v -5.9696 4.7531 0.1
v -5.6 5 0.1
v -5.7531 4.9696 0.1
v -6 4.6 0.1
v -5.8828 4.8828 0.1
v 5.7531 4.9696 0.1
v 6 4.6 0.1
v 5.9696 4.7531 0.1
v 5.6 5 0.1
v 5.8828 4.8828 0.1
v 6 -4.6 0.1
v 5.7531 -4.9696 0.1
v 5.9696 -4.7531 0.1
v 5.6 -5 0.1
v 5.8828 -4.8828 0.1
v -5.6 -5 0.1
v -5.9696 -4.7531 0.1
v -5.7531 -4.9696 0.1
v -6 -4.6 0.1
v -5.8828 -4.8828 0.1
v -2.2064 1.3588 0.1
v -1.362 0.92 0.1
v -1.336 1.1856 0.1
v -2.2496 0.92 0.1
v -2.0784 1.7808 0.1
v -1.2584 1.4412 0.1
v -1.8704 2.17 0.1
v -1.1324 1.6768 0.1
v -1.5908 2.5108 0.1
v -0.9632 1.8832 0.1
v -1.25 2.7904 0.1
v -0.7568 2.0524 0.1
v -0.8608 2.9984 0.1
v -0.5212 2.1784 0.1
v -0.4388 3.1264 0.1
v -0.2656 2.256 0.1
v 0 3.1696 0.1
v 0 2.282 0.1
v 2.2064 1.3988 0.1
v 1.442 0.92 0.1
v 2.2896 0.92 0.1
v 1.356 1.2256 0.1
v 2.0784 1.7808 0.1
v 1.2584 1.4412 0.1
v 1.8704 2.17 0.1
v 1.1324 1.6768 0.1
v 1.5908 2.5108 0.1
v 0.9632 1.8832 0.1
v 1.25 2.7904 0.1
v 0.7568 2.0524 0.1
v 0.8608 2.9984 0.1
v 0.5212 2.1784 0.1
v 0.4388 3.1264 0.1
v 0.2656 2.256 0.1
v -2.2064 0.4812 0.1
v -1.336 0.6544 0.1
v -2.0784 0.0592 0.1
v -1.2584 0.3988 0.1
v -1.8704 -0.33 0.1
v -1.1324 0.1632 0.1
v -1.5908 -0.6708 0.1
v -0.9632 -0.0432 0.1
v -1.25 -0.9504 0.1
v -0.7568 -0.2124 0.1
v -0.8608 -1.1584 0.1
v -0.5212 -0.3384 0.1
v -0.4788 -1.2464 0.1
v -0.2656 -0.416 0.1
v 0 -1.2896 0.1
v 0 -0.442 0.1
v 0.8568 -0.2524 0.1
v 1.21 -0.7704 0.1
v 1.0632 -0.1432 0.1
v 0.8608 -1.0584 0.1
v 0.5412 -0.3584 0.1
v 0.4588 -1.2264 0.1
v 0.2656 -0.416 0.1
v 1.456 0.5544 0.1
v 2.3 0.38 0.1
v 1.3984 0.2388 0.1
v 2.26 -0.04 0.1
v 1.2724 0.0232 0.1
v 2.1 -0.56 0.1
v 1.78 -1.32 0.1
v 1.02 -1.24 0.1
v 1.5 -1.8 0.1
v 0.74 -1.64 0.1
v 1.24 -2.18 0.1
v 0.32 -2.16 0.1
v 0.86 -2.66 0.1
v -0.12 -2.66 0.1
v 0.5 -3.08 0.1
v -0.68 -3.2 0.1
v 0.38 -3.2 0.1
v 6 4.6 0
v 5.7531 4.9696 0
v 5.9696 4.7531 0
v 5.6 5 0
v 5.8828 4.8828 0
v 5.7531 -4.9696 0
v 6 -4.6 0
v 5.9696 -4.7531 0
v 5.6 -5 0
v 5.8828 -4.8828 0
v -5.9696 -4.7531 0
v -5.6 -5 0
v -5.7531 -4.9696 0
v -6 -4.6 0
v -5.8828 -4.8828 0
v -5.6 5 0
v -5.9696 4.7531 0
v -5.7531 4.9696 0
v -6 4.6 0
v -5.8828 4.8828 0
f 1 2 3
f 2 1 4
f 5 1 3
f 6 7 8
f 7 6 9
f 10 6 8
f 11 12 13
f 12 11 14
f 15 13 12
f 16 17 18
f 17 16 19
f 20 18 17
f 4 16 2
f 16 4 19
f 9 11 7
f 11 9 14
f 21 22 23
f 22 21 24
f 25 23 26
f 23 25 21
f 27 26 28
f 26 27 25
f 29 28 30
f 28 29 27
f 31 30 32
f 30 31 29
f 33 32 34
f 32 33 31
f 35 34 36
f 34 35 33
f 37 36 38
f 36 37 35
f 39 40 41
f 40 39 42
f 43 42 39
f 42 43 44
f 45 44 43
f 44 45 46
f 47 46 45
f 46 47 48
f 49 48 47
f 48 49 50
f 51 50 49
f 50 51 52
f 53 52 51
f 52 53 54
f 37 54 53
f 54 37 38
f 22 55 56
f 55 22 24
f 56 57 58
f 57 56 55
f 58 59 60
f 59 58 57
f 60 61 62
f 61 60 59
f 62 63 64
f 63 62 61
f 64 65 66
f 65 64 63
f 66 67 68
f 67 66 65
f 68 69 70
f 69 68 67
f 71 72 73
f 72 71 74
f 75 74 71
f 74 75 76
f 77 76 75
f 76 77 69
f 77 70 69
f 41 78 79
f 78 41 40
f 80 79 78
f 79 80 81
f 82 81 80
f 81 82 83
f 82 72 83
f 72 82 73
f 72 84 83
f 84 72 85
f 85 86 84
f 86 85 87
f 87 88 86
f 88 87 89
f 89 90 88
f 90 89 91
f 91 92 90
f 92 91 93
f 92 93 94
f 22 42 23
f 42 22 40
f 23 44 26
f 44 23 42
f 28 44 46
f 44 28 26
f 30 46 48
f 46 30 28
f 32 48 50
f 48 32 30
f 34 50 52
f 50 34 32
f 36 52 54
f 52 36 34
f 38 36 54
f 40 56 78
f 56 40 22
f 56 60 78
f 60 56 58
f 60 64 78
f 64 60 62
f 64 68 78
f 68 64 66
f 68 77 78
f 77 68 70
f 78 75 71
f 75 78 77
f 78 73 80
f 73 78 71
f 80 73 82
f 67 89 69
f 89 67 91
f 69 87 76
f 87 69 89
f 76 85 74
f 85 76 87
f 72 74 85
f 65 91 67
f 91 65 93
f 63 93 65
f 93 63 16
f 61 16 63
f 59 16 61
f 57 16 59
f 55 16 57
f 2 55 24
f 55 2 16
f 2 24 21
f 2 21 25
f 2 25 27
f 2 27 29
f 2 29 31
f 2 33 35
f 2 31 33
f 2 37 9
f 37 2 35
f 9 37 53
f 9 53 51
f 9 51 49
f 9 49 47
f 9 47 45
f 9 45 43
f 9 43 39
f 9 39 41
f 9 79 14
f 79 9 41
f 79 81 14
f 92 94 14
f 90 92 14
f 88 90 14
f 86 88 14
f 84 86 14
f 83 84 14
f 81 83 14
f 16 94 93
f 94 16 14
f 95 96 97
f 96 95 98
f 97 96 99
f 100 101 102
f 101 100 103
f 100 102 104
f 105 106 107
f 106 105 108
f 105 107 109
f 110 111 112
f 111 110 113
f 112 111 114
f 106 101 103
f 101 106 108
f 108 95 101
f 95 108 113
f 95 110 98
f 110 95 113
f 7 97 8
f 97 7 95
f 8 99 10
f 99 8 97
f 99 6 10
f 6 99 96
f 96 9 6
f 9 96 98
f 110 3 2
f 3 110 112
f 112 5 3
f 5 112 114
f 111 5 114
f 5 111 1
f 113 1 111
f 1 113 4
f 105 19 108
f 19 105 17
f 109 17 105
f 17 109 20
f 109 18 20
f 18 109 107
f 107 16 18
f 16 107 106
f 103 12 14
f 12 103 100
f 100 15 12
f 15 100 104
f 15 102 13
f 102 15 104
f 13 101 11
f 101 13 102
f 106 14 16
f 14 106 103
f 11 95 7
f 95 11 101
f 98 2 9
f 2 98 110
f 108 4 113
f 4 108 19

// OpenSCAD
// file: ../p/1-4cyli.scad
use <../lib.scad>
function ldraw_lib__1_4cyli() = [
// 0 Cylinder 0.25
// 0 Name: 1-4cyli.dat
// 0 Author: James Jessiman
// 0 !LDRAW_ORG Primitive UPDATE 2012-01
// 0 !LICENSE Licensed under CC BY 4.0 : see CAreadme.txt
// 
// 0 BFC CERTIFY CCW
  [0,"BFC","CERTIFY"],
  [0,"BFC","CCW"],
// 
// 0 !HISTORY 2002-03-23 [sbliss] Added BFC statement.
// 0 !HISTORY 2002-04-25 [PTadmin] Official Update 2002-02
// 0 !HISTORY 2007-06-22 [PTadmin] Header formatted for Contributor Agreement
// 0 !HISTORY 2008-07-01 [PTadmin] Official Update 2008-01
// 0 !HISTORY 2012-02-16 [Philo] Changed to CCW
// 0 !HISTORY 2012-03-30 [PTadmin] Official Update 2012-01
// 
// 
// 4 16 1 1 0 0.9239 1 0.3827 0.9239 0 0.3827 1 0 0
  [4,16,1,1,0,0.9239,1,0.3827,0.9239,0,0.3827,1,0,0],
// 5 24 1 0 0 1 1 0 0.9239 0 0.3827 1 0 -1
  [5,24,1,0,0,1,1,0,0.9239,0,0.3827,1,0,-1],
// 4 16 0.9239 1 0.3827 0.7071 1 0.7071 0.7071 0 0.7071 0.9239 0 0.3827
  [4,16,0.9239,1,0.3827,0.7071,1,0.7071,0.7071,0,0.7071,0.9239,0,0.3827],
// 5 24 0.9239 0 0.3827 0.9239 1 0.3827 0.7071 0 0.7071 1 0 0
  [5,24,0.9239,0,0.3827,0.9239,1,0.3827,0.7071,0,0.7071,1,0,0],
// 4 16 0.7071 1 0.7071 0.3827 1 0.9239 0.3827 0 0.9239 0.7071 0 0.7071
  [4,16,0.7071,1,0.7071,0.3827,1,0.9239,0.3827,0,0.9239,0.7071,0,0.7071],
// 5 24 0.7071 0 0.7071 0.7071 1 0.7071 0.3827 0 0.9239 0.9239 0 0.3827
  [5,24,0.7071,0,0.7071,0.7071,1,0.7071,0.3827,0,0.9239,0.9239,0,0.3827],
// 4 16 0.3827 1 0.9239 0 1 1 0 0 1 0.3827 0 0.9239
  [4,16,0.3827,1,0.9239,0,1,1,0,0,1,0.3827,0,0.9239],
// 5 24 0.3827 0 0.9239 0.3827 1 0.9239 0 0 1 0.7071 0 0.7071
  [5,24,0.3827,0,0.9239,0.3827,1,0.9239,0,0,1,0.7071,0,0.7071],
// 5 24 0 0 1 0 1 1 0.3827 0 0.9239 -1 0 1
  [5,24,0,0,1,0,1,1,0.3827,0,0.9239,-1,0,1],
];
module ldraw_lib__1_4cyli(step=0, col=false, unit=2/5, alt=false, line=0.2, solid=!$preview)
    makepoly(ldraw_lib__1_4cyli(), step=step, col=col, unit=unit, alt=alt, line=line, solid=solid);
ldraw_lib__1_4cyli(line=0.2);
// file: ../p/1-4chrd.scad
use <../lib.scad>
function ldraw_lib__1_4chrd() = [
// 0 Chord 0.25
// 0 Name: 1-4chrd.dat
// 0 Author: Max Martin Richter [MMR1988]
// 0 !LDRAW_ORG Primitive UPDATE 2023-05
// 0 !LICENSE Licensed under CC BY 4.0 : see CAreadme.txt
// 
// 0 BFC CERTIFY CCW
  [0,"BFC","CERTIFY"],
  [0,"BFC","CCW"],
// 
// 0 !HISTORY 2004-04-22 [PTadmin] Official Update 2004-02
// 0 !HISTORY 2007-10-09 [PTadmin] Header formatted for Contributor Agreement
// 0 !HISTORY 2008-07-01 [PTadmin] Official Update 2008-01
// 0 !HISTORY 2012-08-02 [MMR1988] Re-creation with PrimGen2 and Rectifier
// 0 !HISTORY 2012-08-09 [PTadmin] Official Update 2012-02
// 0 !HISTORY 2023-10-27 [OrionP] Change author to MMR1988 from hafhead
// 0 !HISTORY 2023-10-31 [OrionP] Official Update 2023-05
// 
// 4 16 0.9239 0 0.3827 0.3827 0 0.9239 0 0 1 1 0 0
  [4,16,0.9239,0,0.3827,0.3827,0,0.9239,0,0,1,1,0,0],
// 3 16 0.7071 0 0.7071 0.3827 0 0.9239 0.9239 0 0.3827
  [3,16,0.7071,0,0.7071,0.3827,0,0.9239,0.9239,0,0.3827],
];
module ldraw_lib__1_4chrd(step=0, col=false, unit=2/5, alt=false, line=0.2, solid=!$preview)
    makepoly(ldraw_lib__1_4chrd(), step=step, col=col, unit=unit, alt=alt, line=line, solid=solid);
ldraw_lib__1_4chrd(line=0.2);
// main file
use <../lib.scad>
use <../p/1-4chrd.scad>
use <../p/1-4cyli.scad>
function ldraw_lib__6196575o() = [
// 0 Sticker  1.2 x  1.5 with White "9" on Black Background
// 0 Name: 6196575o.dat
// 0 Author: Evert-Jan Boer [ejboer]
// 0 !LDRAW_ORG Part UPDATE 2024-08
// 0 !LICENSE Licensed under CC BY 4.0 : see CAreadme.txt
// 
// 0 BFC CERTIFY CCW
  [0,"BFC","CERTIFY"],
  [0,"BFC","CCW"],
// 
// 0 !KEYWORDS London Bus, set 10258
// 
// 0 !HISTORY 2024-09-30 [OrionP] Official Update 2024-08
// 
// 1 0 -14 -.25 11.5 0 0 -1 0 1 0 1 0 0 1-4chrd.dat
  [1,0,-14,-.25,11.5,0,0,-1,0,1,0,1,0,0, ldraw_lib__1_4chrd()],
// 1 0 14 -.25 11.5 1 0 0 0 1 0 0 0 1 1-4chrd.dat
  [1,0,14,-.25,11.5,1,0,0,0,1,0,0,0,1, ldraw_lib__1_4chrd()],
// 1 0 14 -.25 -11.5 0 0 1 0 1 0 -1 0 0 1-4chrd.dat
  [1,0,14,-.25,-11.5,0,0,1,0,1,0,-1,0,0, ldraw_lib__1_4chrd()],
// 1 0 -14 -.25 -11.5 -1 0 0 0 1 0 0 0 -1 1-4chrd.dat
  [1,0,-14,-.25,-11.5,-1,0,0,0,1,0,0,0,-1, ldraw_lib__1_4chrd()],
// 4 0 -15 -.25 -11.5 -14 -.25 -12.5 -14 -.25 12.5 -15 -.25 11.5
  [4,0,-15,-.25,-11.5,-14,-.25,-12.5,-14,-.25,12.5,-15,-.25,11.5],
// 4 0 15 -.25 11.5 14 -.25 12.5 14 -.25 -12.5 15 -.25 -11.5
  [4,0,15,-.25,11.5,14,-.25,12.5,14,-.25,-12.5,15,-.25,-11.5],
// 4 15 -3.34 -.25 2.964 -5.516 -.25 3.397 -5.624 -.25 2.3 -3.405 -.25 2.3
  [4,15,-3.34,-.25,2.964,-5.516,-.25,3.397,-5.624,-.25,2.3,-3.405,-.25,2.3],
// 4 15 -5.516 -.25 3.397 -3.34 -.25 2.964 -3.146 -.25 3.603 -5.196 -.25 4.452
  [4,15,-5.516,-.25,3.397,-3.34,-.25,2.964,-3.146,-.25,3.603,-5.196,-.25,4.452],
// 4 15 -2.831 -.25 4.192 -4.676 -.25 5.425 -5.196 -.25 4.452 -3.146 -.25 3.603
  [4,15,-2.831,-.25,4.192,-4.676,-.25,5.425,-5.196,-.25,4.452,-3.146,-.25,3.603],
// 4 15 -4.676 -.25 5.425 -2.831 -.25 4.192 -2.408 -.25 4.708 -3.977 -.25 6.277
  [4,15,-4.676,-.25,5.425,-2.831,-.25,4.192,-2.408,-.25,4.708,-3.977,-.25,6.277],
// 4 15 -1.892 -.25 5.131 -3.125 -.25 6.976 -3.977 -.25 6.277 -2.408 -.25 4.708
  [4,15,-1.892,-.25,5.131,-3.125,-.25,6.976,-3.977,-.25,6.277,-2.408,-.25,4.708],
// 4 15 -3.125 -.25 6.976 -1.892 -.25 5.131 -1.303 -.25 5.446 -2.152 -.25 7.496
  [4,15,-3.125,-.25,6.976,-1.892,-.25,5.131,-1.303,-.25,5.446,-2.152,-.25,7.496],
// 4 15 -2.152 -.25 7.496 -1.303 -.25 5.446 -.664 -.25 5.64 -1.097 -.25 7.816
  [4,15,-2.152,-.25,7.496,-1.303,-.25,5.446,-.664,-.25,5.64,-1.097,-.25,7.816],
// 4 15 -1.097 -.25 7.816 -.664 -.25 5.64 0 -.25 5.705 0 -.25 7.924
  [4,15,-1.097,-.25,7.816,-.664,-.25,5.64,0,-.25,5.705,0,-.25,7.924],
// 4 15 3.39 -.25 3.064 3.605 -.25 2.3 5.724 -.25 2.3 5.516 -.25 3.497
  [4,15,3.39,-.25,3.064,3.605,-.25,2.3,5.724,-.25,2.3,5.516,-.25,3.497],
// 4 15 5.516 -.25 3.497 5.196 -.25 4.452 3.146 -.25 3.603 3.39 -.25 3.064
  [4,15,5.516,-.25,3.497,5.196,-.25,4.452,3.146,-.25,3.603,3.39,-.25,3.064],
// 4 15 2.831 -.25 4.192 3.146 -.25 3.603 5.196 -.25 4.452 4.676 -.25 5.425
  [4,15,2.831,-.25,4.192,3.146,-.25,3.603,5.196,-.25,4.452,4.676,-.25,5.425],
// 4 15 4.676 -.25 5.425 3.977 -.25 6.277 2.408 -.25 4.708 2.831 -.25 4.192
  [4,15,4.676,-.25,5.425,3.977,-.25,6.277,2.408,-.25,4.708,2.831,-.25,4.192],
// 4 15 1.892 -.25 5.131 2.408 -.25 4.708 3.977 -.25 6.277 3.125 -.25 6.976
  [4,15,1.892,-.25,5.131,2.408,-.25,4.708,3.977,-.25,6.277,3.125,-.25,6.976],
// 4 15 3.125 -.25 6.976 2.152 -.25 7.496 1.303 -.25 5.446 1.892 -.25 5.131
  [4,15,3.125,-.25,6.976,2.152,-.25,7.496,1.303,-.25,5.446,1.892,-.25,5.131],
// 4 15 2.152 -.25 7.496 1.097 -.25 7.816 .664 -.25 5.64 1.303 -.25 5.446
  [4,15,2.152,-.25,7.496,1.097,-.25,7.816,.664,-.25,5.64,1.303,-.25,5.446],
// 4 15 1.097 -.25 7.816 0 -.25 7.924 0 -.25 5.705 .664 -.25 5.64
  [4,15,1.097,-.25,7.816,0,-.25,7.924,0,-.25,5.705,.664,-.25,5.64],
// 4 15 -3.34 -.25 1.636 -3.405 -.25 2.3 -5.624 -.25 2.3 -5.516 -.25 1.203
  [4,15,-3.34,-.25,1.636,-3.405,-.25,2.3,-5.624,-.25,2.3,-5.516,-.25,1.203],
// 4 15 -5.516 -.25 1.203 -5.196 -.25 .148 -3.146 -.25 .997 -3.34 -.25 1.636
  [4,15,-5.516,-.25,1.203,-5.196,-.25,.148,-3.146,-.25,.997,-3.34,-.25,1.636],
// 4 15 -2.831 -.25 .408 -3.146 -.25 .997 -5.196 -.25 .148 -4.676 -.25 -.825
  [4,15,-2.831,-.25,.408,-3.146,-.25,.997,-5.196,-.25,.148,-4.676,-.25,-.825],
// 4 15 -4.676 -.25 -.825 -3.977 -.25 -1.677 -2.408 -.25 -.108 -2.831 -.25 .408
  [4,15,-4.676,-.25,-.825,-3.977,-.25,-1.677,-2.408,-.25,-.108,-2.831,-.25,.408],
// 4 15 -1.892 -.25 -.531 -2.408 -.25 -.108 -3.977 -.25 -1.677 -3.125 -.25 -2.376
  [4,15,-1.892,-.25,-.531,-2.408,-.25,-.108,-3.977,-.25,-1.677,-3.125,-.25,-2.376],
// 4 15 -3.125 -.25 -2.376 -2.152 -.25 -2.896 -1.303 -.25 -.846 -1.892 -.25 -.531
  [4,15,-3.125,-.25,-2.376,-2.152,-.25,-2.896,-1.303,-.25,-.846,-1.892,-.25,-.531],
// 4 15 -2.152 -.25 -2.896 -1.197 -.25 -3.116 -.664 -.25 -1.04 -1.303 -.25 -.846
  [4,15,-2.152,-.25,-2.896,-1.197,-.25,-3.116,-.664,-.25,-1.04,-1.303,-.25,-.846],
// 4 15 -1.197 -.25 -3.116 0 -.25 -3.224 0 -.25 -1.105 -.664 -.25 -1.04
  [4,15,-1.197,-.25,-3.116,0,-.25,-3.224,0,-.25,-1.105,-.664,-.25,-1.04],
// 4 15 2.152 -.25 -2.646 3.025 -.25 -1.926 2.658 -.25 -.358 2.142 -.25 -.631
  [4,15,2.152,-.25,-2.646,3.025,-.25,-1.926,2.658,-.25,-.358,2.142,-.25,-.631],
// 4 15 2.142 -.25 -.631 1.353 -.25 -.896 1.147 -.25 -3.066 2.152 -.25 -2.646
  [4,15,2.142,-.25,-.631,1.353,-.25,-.896,1.147,-.25,-3.066,2.152,-.25,-2.646],
// 4 15 0 -.25 -3.224 1.147 -.25 -3.066 1.353 -.25 -.896 .664 -.25 -1.04
  [4,15,0,-.25,-3.224,1.147,-.25,-3.066,1.353,-.25,-.896,.664,-.25,-1.04],
// 3 15 .664 -.25 -1.04 0 -.25 -1.105 0 -.25 -3.224
  [3,15,.664,-.25,-1.04,0,-.25,-1.105,0,-.25,-3.224],
// 4 15 5.75 -.25 .95 5.724 -.25 2.3 3.605 -.25 2.3 3.64 -.25 1.386
  [4,15,5.75,-.25,.95,5.724,-.25,2.3,3.605,-.25,2.3,3.64,-.25,1.386],
// 4 15 5.65 -.25 -.1 5.75 -.25 .95 3.64 -.25 1.386 3.496 -.25 .597
  [4,15,5.65,-.25,-.1,5.75,-.25,.95,3.64,-.25,1.386,3.496,-.25,.597],
// 4 15 3.496 -.25 .597 3.181 -.25 .058 5.25 -.25 -1.4 5.65 -.25 -.1
  [4,15,3.496,-.25,.597,3.181,-.25,.058,5.25,-.25,-1.4,5.65,-.25,-.1],
// 4 15 3.181 -.25 .058 2.658 -.25 -.358 3.025 -.25 -1.926 5.25 -.25 -1.4
  [4,15,3.181,-.25,.058,2.658,-.25,-.358,3.025,-.25,-1.926,5.25,-.25,-1.4],
// 4 15 5.25 -.25 -1.4 3.025 -.25 -1.926 2.55 -.25 -3.1 4.45 -.25 -3.3
  [4,15,5.25,-.25,-1.4,3.025,-.25,-1.926,2.55,-.25,-3.1,4.45,-.25,-3.3],
// 4 15 1.85 -.25 -4.1 3.75 -.25 -4.5 4.45 -.25 -3.3 2.55 -.25 -3.1
  [4,15,1.85,-.25,-4.1,3.75,-.25,-4.5,4.45,-.25,-3.3,2.55,-.25,-3.1],
// 4 15 .8 -.25 -5.4 3.1 -.25 -5.45 3.75 -.25 -4.5 1.85 -.25 -4.1
  [4,15,.8,-.25,-5.4,3.1,-.25,-5.45,3.75,-.25,-4.5,1.85,-.25,-4.1],
// 4 15 -.3 -.25 -6.65 2.15 -.25 -6.65 3.1 -.25 -5.45 .8 -.25 -5.4
  [4,15,-.3,-.25,-6.65,2.15,-.25,-6.65,3.1,-.25,-5.45,.8,-.25,-5.4],
// 4 15 2.15 -.25 -6.65 -.3 -.25 -6.65 -1.7 -.25 -8 1.25 -.25 -7.7
  [4,15,2.15,-.25,-6.65,-.3,-.25,-6.65,-1.7,-.25,-8,1.25,-.25,-7.7],
// 3 15 1.25 -.25 -7.7 -1.7 -.25 -8 .95 -.25 -8
  [3,15,1.25,-.25,-7.7,-1.7,-.25,-8,.95,-.25,-8],
// 4 0 -3.405 -.25 2.3 3.605 -.25 2.3 3.39 -.25 3.064 -3.34 -.25 2.964
  [4,0,-3.405,-.25,2.3,3.605,-.25,2.3,3.39,-.25,3.064,-3.34,-.25,2.964],
// 4 0 3.39 -.25 3.064 3.146 -.25 3.603 -3.146 -.25 3.603 -3.34 -.25 2.964
  [4,0,3.39,-.25,3.064,3.146,-.25,3.603,-3.146,-.25,3.603,-3.34,-.25,2.964],
// 4 0 -3.146 -.25 3.603 3.146 -.25 3.603 2.831 -.25 4.192 -2.831 -.25 4.192
  [4,0,-3.146,-.25,3.603,3.146,-.25,3.603,2.831,-.25,4.192,-2.831,-.25,4.192],
// 4 0 -2.408 -.25 4.708 -2.831 -.25 4.192 2.831 -.25 4.192 2.408 -.25 4.708
  [4,0,-2.408,-.25,4.708,-2.831,-.25,4.192,2.831,-.25,4.192,2.408,-.25,4.708],
// 4 0 -2.408 -.25 4.708 2.408 -.25 4.708 1.892 -.25 5.131 -1.892 -.25 5.131
  [4,0,-2.408,-.25,4.708,2.408,-.25,4.708,1.892,-.25,5.131,-1.892,-.25,5.131],
// 4 0 -1.303 -.25 5.446 -1.892 -.25 5.131 1.892 -.25 5.131 1.303 -.25 5.446
  [4,0,-1.303,-.25,5.446,-1.892,-.25,5.131,1.892,-.25,5.131,1.303,-.25,5.446],
// 4 0 1.303 -.25 5.446 .664 -.25 5.64 -.664 -.25 5.64 -1.303 -.25 5.446
  [4,0,1.303,-.25,5.446,.664,-.25,5.64,-.664,-.25,5.64,-1.303,-.25,5.446],
// 3 0 0 -.25 5.705 -.664 -.25 5.64 .664 -.25 5.64
  [3,0,0,-.25,5.705,-.664,-.25,5.64,.664,-.25,5.64],
// 4 0 -3.34 -.25 1.636 3.64 -.25 1.386 3.605 -.25 2.3 -3.405 -.25 2.3
  [4,0,-3.34,-.25,1.636,3.64,-.25,1.386,3.605,-.25,2.3,-3.405,-.25,2.3],
// 4 0 -3.34 -.25 1.636 -3.146 -.25 .997 -2.831 -.25 .408 3.64 -.25 1.386
  [4,0,-3.34,-.25,1.636,-3.146,-.25,.997,-2.831,-.25,.408,3.64,-.25,1.386],
// 4 0 -1.892 -.25 -.531 3.64 -.25 1.386 -2.831 -.25 .408 -2.408 -.25 -.108
  [4,0,-1.892,-.25,-.531,3.64,-.25,1.386,-2.831,-.25,.408,-2.408,-.25,-.108],
// 4 0 -.664 -.25 -1.04 3.64 -.25 1.386 -1.892 -.25 -.531 -1.303 -.25 -.846
  [4,0,-.664,-.25,-1.04,3.64,-.25,1.386,-1.892,-.25,-.531,-1.303,-.25,-.846],
// 4 0 .664 -.25 -1.04 3.64 -.25 1.386 -.664 -.25 -1.04 0 -.25 -1.105
  [4,0,.664,-.25,-1.04,3.64,-.25,1.386,-.664,-.25,-1.04,0,-.25,-1.105],
// 4 0 2.142 -.25 -.631 3.64 -.25 1.386 .664 -.25 -1.04 1.353 -.25 -.896
  [4,0,2.142,-.25,-.631,3.64,-.25,1.386,.664,-.25,-1.04,1.353,-.25,-.896],
// 4 0 3.496 -.25 .597 3.64 -.25 1.386 2.142 -.25 -.631 2.658 -.25 -.358
  [4,0,3.496,-.25,.597,3.64,-.25,1.386,2.142,-.25,-.631,2.658,-.25,-.358],
// 3 0 3.496 -.25 .597 2.658 -.25 -.358 3.181 -.25 .058
  [3,0,3.496,-.25,.597,2.658,-.25,-.358,3.181,-.25,.058],
// 4 0 .8 -.25 -5.4 0 -.25 -3.224 -1.197 -.25 -3.116 -.3 -.25 -6.65
  [4,0,.8,-.25,-5.4,0,-.25,-3.224,-1.197,-.25,-3.116,-.3,-.25,-6.65],
// 4 0 1.85 -.25 -4.1 1.147 -.25 -3.066 0 -.25 -3.224 .8 -.25 -5.4
  [4,0,1.85,-.25,-4.1,1.147,-.25,-3.066,0,-.25,-3.224,.8,-.25,-5.4],
// 4 0 2.55 -.25 -3.1 2.152 -.25 -2.646 1.147 -.25 -3.066 1.85 -.25 -4.1
  [4,0,2.55,-.25,-3.1,2.152,-.25,-2.646,1.147,-.25,-3.066,1.85,-.25,-4.1],
// 3 0 3.025 -.25 -1.926 2.152 -.25 -2.646 2.55 -.25 -3.1
  [3,0,3.025,-.25,-1.926,2.152,-.25,-2.646,2.55,-.25,-3.1],
// 4 0 -.3 -.25 -6.65 -1.197 -.25 -3.116 -2.152 -.25 -2.896 -1.7 -.25 -8
  [4,0,-.3,-.25,-6.65,-1.197,-.25,-3.116,-2.152,-.25,-2.896,-1.7,-.25,-8],
// 4 0 -14 -.25 -12.5 -1.7 -.25 -8 -2.152 -.25 -2.896 -3.125 -.25 -2.376
  [4,0,-14,-.25,-12.5,-1.7,-.25,-8,-2.152,-.25,-2.896,-3.125,-.25,-2.376],
// 3 0 -3.977 -.25 -1.677 -14 -.25 -12.5 -3.125 -.25 -2.376
  [3,0,-3.977,-.25,-1.677,-14,-.25,-12.5,-3.125,-.25,-2.376],
// 3 0 -4.676 -.25 -.825 -14 -.25 -12.5 -3.977 -.25 -1.677
  [3,0,-4.676,-.25,-.825,-14,-.25,-12.5,-3.977,-.25,-1.677],
// 3 0 -5.196 -.25 .148 -14 -.25 -12.5 -4.676 -.25 -.825
  [3,0,-5.196,-.25,.148,-14,-.25,-12.5,-4.676,-.25,-.825],
// 3 0 -5.516 -.25 1.203 -14 -.25 -12.5 -5.196 -.25 .148
  [3,0,-5.516,-.25,1.203,-14,-.25,-12.5,-5.196,-.25,.148],
// 4 0 -14 -.25 12.5 -14 -.25 -12.5 -5.516 -.25 1.203 -5.624 -.25 2.3
  [4,0,-14,-.25,12.5,-14,-.25,-12.5,-5.516,-.25,1.203,-5.624,-.25,2.3],
// 3 0 -14 -.25 12.5 -5.624 -.25 2.3 -5.516 -.25 3.397
  [3,0,-14,-.25,12.5,-5.624,-.25,2.3,-5.516,-.25,3.397],
// 3 0 -14 -.25 12.5 -5.516 -.25 3.397 -5.196 -.25 4.452
  [3,0,-14,-.25,12.5,-5.516,-.25,3.397,-5.196,-.25,4.452],
// 3 0 -14 -.25 12.5 -5.196 -.25 4.452 -4.676 -.25 5.425
  [3,0,-14,-.25,12.5,-5.196,-.25,4.452,-4.676,-.25,5.425],
// 3 0 -14 -.25 12.5 -4.676 -.25 5.425 -3.977 -.25 6.277
  [3,0,-14,-.25,12.5,-4.676,-.25,5.425,-3.977,-.25,6.277],
// 3 0 -14 -.25 12.5 -3.977 -.25 6.277 -3.125 -.25 6.976
  [3,0,-14,-.25,12.5,-3.977,-.25,6.277,-3.125,-.25,6.976],
// 3 0 -14 -.25 12.5 -2.152 -.25 7.496 -1.097 -.25 7.816
  [3,0,-14,-.25,12.5,-2.152,-.25,7.496,-1.097,-.25,7.816],
// 3 0 -14 -.25 12.5 -3.125 -.25 6.976 -2.152 -.25 7.496
  [3,0,-14,-.25,12.5,-3.125,-.25,6.976,-2.152,-.25,7.496],
// 4 0 -1.097 -.25 7.816 0 -.25 7.924 14 -.25 12.5 -14 -.25 12.5
  [4,0,-1.097,-.25,7.816,0,-.25,7.924,14,-.25,12.5,-14,-.25,12.5],
// 3 0 14 -.25 12.5 0 -.25 7.924 1.097 -.25 7.816
  [3,0,14,-.25,12.5,0,-.25,7.924,1.097,-.25,7.816],
// 3 0 14 -.25 12.5 1.097 -.25 7.816 2.152 -.25 7.496
  [3,0,14,-.25,12.5,1.097,-.25,7.816,2.152,-.25,7.496],
// 3 0 14 -.25 12.5 2.152 -.25 7.496 3.125 -.25 6.976
  [3,0,14,-.25,12.5,2.152,-.25,7.496,3.125,-.25,6.976],
// 3 0 14 -.25 12.5 3.125 -.25 6.976 3.977 -.25 6.277
  [3,0,14,-.25,12.5,3.125,-.25,6.976,3.977,-.25,6.277],
// 3 0 14 -.25 12.5 3.977 -.25 6.277 4.676 -.25 5.425
  [3,0,14,-.25,12.5,3.977,-.25,6.277,4.676,-.25,5.425],
// 3 0 14 -.25 12.5 4.676 -.25 5.425 5.196 -.25 4.452
  [3,0,14,-.25,12.5,4.676,-.25,5.425,5.196,-.25,4.452],
// 3 0 14 -.25 12.5 5.196 -.25 4.452 5.516 -.25 3.497
  [3,0,14,-.25,12.5,5.196,-.25,4.452,5.516,-.25,3.497],
// 3 0 14 -.25 12.5 5.516 -.25 3.497 5.724 -.25 2.3
  [3,0,14,-.25,12.5,5.516,-.25,3.497,5.724,-.25,2.3],
// 4 0 5.724 -.25 2.3 5.75 -.25 .95 14 -.25 -12.5 14 -.25 12.5
  [4,0,5.724,-.25,2.3,5.75,-.25,.95,14,-.25,-12.5,14,-.25,12.5],
// 3 0 5.75 -.25 .95 5.65 -.25 -.1 14 -.25 -12.5
  [3,0,5.75,-.25,.95,5.65,-.25,-.1,14,-.25,-12.5],
// 3 0 1.25 -.25 -7.7 .95 -.25 -8 14 -.25 -12.5
  [3,0,1.25,-.25,-7.7,.95,-.25,-8,14,-.25,-12.5],
// 3 0 2.15 -.25 -6.65 1.25 -.25 -7.7 14 -.25 -12.5
  [3,0,2.15,-.25,-6.65,1.25,-.25,-7.7,14,-.25,-12.5],
// 3 0 3.1 -.25 -5.45 2.15 -.25 -6.65 14 -.25 -12.5
  [3,0,3.1,-.25,-5.45,2.15,-.25,-6.65,14,-.25,-12.5],
// 3 0 3.75 -.25 -4.5 3.1 -.25 -5.45 14 -.25 -12.5
  [3,0,3.75,-.25,-4.5,3.1,-.25,-5.45,14,-.25,-12.5],
// 3 0 4.45 -.25 -3.3 3.75 -.25 -4.5 14 -.25 -12.5
  [3,0,4.45,-.25,-3.3,3.75,-.25,-4.5,14,-.25,-12.5],
// 3 0 5.25 -.25 -1.4 4.45 -.25 -3.3 14 -.25 -12.5
  [3,0,5.25,-.25,-1.4,4.45,-.25,-3.3,14,-.25,-12.5],
// 3 0 5.65 -.25 -.1 5.25 -.25 -1.4 14 -.25 -12.5
  [3,0,5.65,-.25,-.1,5.25,-.25,-1.4,14,-.25,-12.5],
// 4 0 -1.7 -.25 -8 -14 -.25 -12.5 14 -.25 -12.5 .95 -.25 -8
  [4,0,-1.7,-.25,-8,-14,-.25,-12.5,14,-.25,-12.5,.95,-.25,-8],
// 
// 1 16 14 0 11.5 1 0 0 0 -1 0 0 0 1 1-4chrd.dat
  [1,16,14,0,11.5,1,0,0,0,-1,0,0,0,1, ldraw_lib__1_4chrd()],
// 1 16 14 0 -11.5 0 0 1 0 -1 0 -1 0 0 1-4chrd.dat
  [1,16,14,0,-11.5,0,0,1,0,-1,0,-1,0,0, ldraw_lib__1_4chrd()],
// 1 16 -14 0 -11.5 -1 0 0 0 -1 0 0 0 -1 1-4chrd.dat
  [1,16,-14,0,-11.5,-1,0,0,0,-1,0,0,0,-1, ldraw_lib__1_4chrd()],
// 1 16 -14 0 11.5 0 0 -1 0 -1 0 1 0 0 1-4chrd.dat
  [1,16,-14,0,11.5,0,0,-1,0,-1,0,1,0,0, ldraw_lib__1_4chrd()],
// 4 16 14 0 -12.5 -14 0 -12.5 -15 0 -11.5 15 0 -11.5
  [4,16,14,0,-12.5,-14,0,-12.5,-15,0,-11.5,15,0,-11.5],
// 4 16 15 0 11.5 15 0 -11.5 -15 0 -11.5 -15 0 11.5
  [4,16,15,0,11.5,15,0,-11.5,-15,0,-11.5,-15,0,11.5],
// 4 16 15 0 11.5 -15 0 11.5 -14 0 12.5 14 0 12.5
  [4,16,15,0,11.5,-15,0,11.5,-14,0,12.5,14,0,12.5],
// 
// 1 16 14 -.25 11.5 1 0 0 0 .25 0 0 0 1 1-4cyli.dat
  [1,16,14,-.25,11.5,1,0,0,0,.25,0,0,0,1, ldraw_lib__1_4cyli()],
// 1 16 -14 -.25 11.5 0 0 -1 0 .25 0 1 0 0 1-4cyli.dat
  [1,16,-14,-.25,11.5,0,0,-1,0,.25,0,1,0,0, ldraw_lib__1_4cyli()],
// 1 16 -14 -.25 -11.5 -1 0 0 0 .25 0 0 0 -1 1-4cyli.dat
  [1,16,-14,-.25,-11.5,-1,0,0,0,.25,0,0,0,-1, ldraw_lib__1_4cyli()],
// 1 16 14 -.25 -11.5 0 0 1 0 .25 0 -1 0 0 1-4cyli.dat
  [1,16,14,-.25,-11.5,0,0,1,0,.25,0,-1,0,0, ldraw_lib__1_4cyli()],
// 4 16 14 -.25 -12.5 -14 -.25 -12.5 -14 0 -12.5 14 0 -12.5
  [4,16,14,-.25,-12.5,-14,-.25,-12.5,-14,0,-12.5,14,0,-12.5],
// 4 16 15 -.25 11.5 15 -.25 -11.5 15 0 -11.5 15 0 11.5
  [4,16,15,-.25,11.5,15,-.25,-11.5,15,0,-11.5,15,0,11.5],
// 4 16 -14 -.25 12.5 14 -.25 12.5 14 0 12.5 -14 0 12.5
  [4,16,-14,-.25,12.5,14,-.25,12.5,14,0,12.5,-14,0,12.5],
// 4 16 -15 -.25 -11.5 -15 -.25 11.5 -15 0 11.5 -15 0 -11.5
  [4,16,-15,-.25,-11.5,-15,-.25,11.5,-15,0,11.5,-15,0,-11.5],
];
module ldraw_lib__6196575o(step=0, col=false, unit=2/5, alt=false, line=0.2, solid=!$preview)
    makepoly(ldraw_lib__6196575o(), step=step, col=col, unit=unit, alt=alt, line=line, solid=solid);
ldraw_lib__6196575o(line=0.2);
